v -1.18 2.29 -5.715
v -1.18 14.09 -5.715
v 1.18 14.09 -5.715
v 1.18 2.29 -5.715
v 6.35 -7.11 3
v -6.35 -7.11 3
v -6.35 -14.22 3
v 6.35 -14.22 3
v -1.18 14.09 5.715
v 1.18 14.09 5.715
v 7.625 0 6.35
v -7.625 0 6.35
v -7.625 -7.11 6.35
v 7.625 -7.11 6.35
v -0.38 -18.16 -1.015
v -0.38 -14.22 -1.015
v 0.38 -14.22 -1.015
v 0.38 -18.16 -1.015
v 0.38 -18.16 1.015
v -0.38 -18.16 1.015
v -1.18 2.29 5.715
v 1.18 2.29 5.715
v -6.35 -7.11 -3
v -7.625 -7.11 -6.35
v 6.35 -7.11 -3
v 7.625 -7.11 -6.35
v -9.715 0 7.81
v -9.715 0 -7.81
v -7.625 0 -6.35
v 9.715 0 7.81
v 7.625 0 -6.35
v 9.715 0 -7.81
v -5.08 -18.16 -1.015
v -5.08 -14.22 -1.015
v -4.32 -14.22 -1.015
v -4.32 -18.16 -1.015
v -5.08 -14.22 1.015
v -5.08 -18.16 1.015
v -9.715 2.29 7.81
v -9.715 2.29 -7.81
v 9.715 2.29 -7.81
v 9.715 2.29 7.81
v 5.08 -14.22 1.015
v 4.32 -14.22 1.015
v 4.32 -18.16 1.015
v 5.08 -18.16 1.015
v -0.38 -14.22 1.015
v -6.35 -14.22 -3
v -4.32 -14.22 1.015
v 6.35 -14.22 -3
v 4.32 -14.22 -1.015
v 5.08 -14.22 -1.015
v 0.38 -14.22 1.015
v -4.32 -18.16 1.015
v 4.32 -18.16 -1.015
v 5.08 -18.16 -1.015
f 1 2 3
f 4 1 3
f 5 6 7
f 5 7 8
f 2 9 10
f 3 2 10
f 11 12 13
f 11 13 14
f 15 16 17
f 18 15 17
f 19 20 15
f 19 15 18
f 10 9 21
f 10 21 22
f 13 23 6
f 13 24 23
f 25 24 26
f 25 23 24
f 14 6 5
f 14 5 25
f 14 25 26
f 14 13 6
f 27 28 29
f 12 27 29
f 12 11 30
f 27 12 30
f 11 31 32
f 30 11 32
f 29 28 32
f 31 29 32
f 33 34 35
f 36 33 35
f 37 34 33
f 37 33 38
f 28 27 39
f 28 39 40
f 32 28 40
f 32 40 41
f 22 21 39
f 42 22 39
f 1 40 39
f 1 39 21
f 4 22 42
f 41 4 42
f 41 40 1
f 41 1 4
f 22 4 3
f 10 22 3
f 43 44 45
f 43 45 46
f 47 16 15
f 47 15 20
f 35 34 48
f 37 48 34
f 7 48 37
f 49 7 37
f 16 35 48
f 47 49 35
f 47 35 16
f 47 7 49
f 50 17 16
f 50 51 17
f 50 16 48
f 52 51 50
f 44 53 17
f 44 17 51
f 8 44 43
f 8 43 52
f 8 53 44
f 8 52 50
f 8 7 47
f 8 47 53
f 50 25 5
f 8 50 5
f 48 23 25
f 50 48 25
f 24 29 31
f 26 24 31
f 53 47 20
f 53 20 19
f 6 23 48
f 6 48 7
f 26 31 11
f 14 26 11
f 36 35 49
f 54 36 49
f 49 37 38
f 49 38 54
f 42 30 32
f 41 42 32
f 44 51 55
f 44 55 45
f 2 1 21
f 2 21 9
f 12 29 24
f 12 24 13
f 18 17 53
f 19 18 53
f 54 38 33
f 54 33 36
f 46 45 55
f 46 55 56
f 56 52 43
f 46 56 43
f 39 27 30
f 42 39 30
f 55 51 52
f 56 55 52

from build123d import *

# Parameters (mm, degrees)
SKETCH1_W                = 19.43
SKETCH1_H                = 15.62
BOSS_EXTRUDE1_DEPTH      = 2.29
SKETCH5_W                = 15.25
SKETCH5_H                = 12.7
BOSS_EXTRUDE2_DEPTH      = 7.11
SKETCH6_W                = 12.7
SKETCH6_H                = 6
BOSS_EXTRUDE3_DEPTH      = 7.11
SKETCH7_W                = 0.76
SKETCH7_H                = 2.03
BOSS_EXTRUDE4_DEPTH      = 3.94
BOSS_EXTRUDE5_DEPTH      = 5.715
BOSS_EXTRUDE5_DEPTH_BACK = 5.715
SKETCH8_W                = 2.36
SKETCH8_H                = 17.09


with BuildPart() as part:
    # Sketch1 → Boss-Extrude1 (new body)
    with BuildSketch(Plane(origin=(0, 0, 0), x_dir=(1, 0, 0), z_dir=(0, 1, 0))):
        Rectangle(SKETCH1_W, SKETCH1_H)
    extrude(amount=BOSS_EXTRUDE1_DEPTH)

    # Sketch5 → Boss-Extrude2 (add)
    with BuildSketch(Plane.XZ):
        Rectangle(SKETCH5_W, SKETCH5_H)
    extrude(amount=BOSS_EXTRUDE2_DEPTH)

    # Sketch6 → Boss-Extrude3 (add)
    with BuildSketch(Plane.XZ.offset(7.11)):
        Rectangle(SKETCH6_W, SKETCH6_H)
    extrude(amount=BOSS_EXTRUDE3_DEPTH)

    # Sketch7 → Boss-Extrude4 (add)
    with BuildSketch(Plane.XZ.offset(14.22)):
        Rectangle(SKETCH7_W, SKETCH7_H)
        with Locations((-4.7, 0)):
            Rectangle(SKETCH7_W, SKETCH7_H)
        with Locations((4.7, 0)):
            Rectangle(SKETCH7_W, SKETCH7_H)
    extrude(amount=BOSS_EXTRUDE4_DEPTH)

    # Sketch8 → Boss-Extrude5 (add, two sides: drawn at the far end of the back side and taken through both)
    with BuildSketch(Plane.XY.offset(-BOSS_EXTRUDE5_DEPTH_BACK)):
        with Locations((0, 5.545)):
            Rectangle(SKETCH8_W, SKETCH8_H)
    extrude(amount=BOSS_EXTRUDE5_DEPTH + BOSS_EXTRUDE5_DEPTH_BACK)


solid = part.part
